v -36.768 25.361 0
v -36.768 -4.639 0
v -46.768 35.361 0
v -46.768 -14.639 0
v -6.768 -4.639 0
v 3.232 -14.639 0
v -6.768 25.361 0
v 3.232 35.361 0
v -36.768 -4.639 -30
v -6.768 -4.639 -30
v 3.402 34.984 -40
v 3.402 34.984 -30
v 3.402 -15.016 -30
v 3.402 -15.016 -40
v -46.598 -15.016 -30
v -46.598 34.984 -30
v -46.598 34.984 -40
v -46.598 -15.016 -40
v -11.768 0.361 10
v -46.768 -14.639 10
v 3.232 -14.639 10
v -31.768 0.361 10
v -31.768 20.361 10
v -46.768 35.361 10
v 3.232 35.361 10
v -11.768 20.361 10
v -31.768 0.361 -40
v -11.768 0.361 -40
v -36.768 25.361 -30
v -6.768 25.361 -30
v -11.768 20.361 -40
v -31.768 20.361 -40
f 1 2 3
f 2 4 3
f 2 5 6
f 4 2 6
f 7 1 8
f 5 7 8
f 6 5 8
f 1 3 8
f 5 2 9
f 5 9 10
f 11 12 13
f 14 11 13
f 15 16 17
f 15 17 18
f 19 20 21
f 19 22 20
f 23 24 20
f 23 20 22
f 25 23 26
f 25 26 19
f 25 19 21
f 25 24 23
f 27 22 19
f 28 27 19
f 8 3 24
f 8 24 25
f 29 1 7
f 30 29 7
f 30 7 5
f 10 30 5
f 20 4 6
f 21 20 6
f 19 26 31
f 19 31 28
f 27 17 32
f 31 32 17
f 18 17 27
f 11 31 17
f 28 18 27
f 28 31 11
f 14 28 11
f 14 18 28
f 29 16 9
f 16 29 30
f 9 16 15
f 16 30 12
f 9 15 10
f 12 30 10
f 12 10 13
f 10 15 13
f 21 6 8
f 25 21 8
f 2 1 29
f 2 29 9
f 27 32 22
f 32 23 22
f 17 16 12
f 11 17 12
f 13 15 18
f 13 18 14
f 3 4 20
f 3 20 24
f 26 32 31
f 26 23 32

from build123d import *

# Parameters (mm, degrees)
F0_W     = 50
F0_H     = 50
F0_W_2   = 20
F0_H_2   = 20
F1_DEPTH = 10
F2_W     = 30
F2_H     = 30
F2_W_2   = 20
F2_H_2   = 20
F3_DEPTH = 30
F4_W     = 50
F4_H     = 50
F4_W_2   = 20
F4_H_2   = 20
F5_DEPTH = 10


with BuildPart() as f1:
    # F0 (on Top) → F1 (new body)
    with BuildSketch(Plane.XY):
        with Locations((-21.768434, 10.361008)):
            Rectangle(F0_W, F0_H)
        with Locations((-21.768434, 10.361008)):
            Rectangle(F0_W_2, F0_H_2, mode=Mode.SUBTRACT)
    extrude(amount=F1_DEPTH)

    # F2 (on face) → F3 (join)
    with BuildSketch(Plane(origin=(0, 0, 0), x_dir=(1, 0, 0), z_dir=(0, 0, -1))):
        with Locations((-21.768434, -10.361008)):
            Rectangle(F2_W, F2_H)
        with Locations((-21.768434, -10.361008)):
            Rectangle(F2_W_2, F2_H_2, mode=Mode.SUBTRACT)
    extrude(amount=F3_DEPTH)

    # F4 (on face) → F5 (join)
    with BuildSketch(Plane(origin=(0, 0, -30), x_dir=(1, 0, 0), z_dir=(0, 0, -1))):
        with Locations((-21.598472, -9.984265)):
            Rectangle(F4_W, F4_H)
        with Locations((-21.768434, -10.361008)):
            Rectangle(F4_W_2, F4_H_2, mode=Mode.SUBTRACT)
    extrude(amount=F5_DEPTH)


solid = f1.part
